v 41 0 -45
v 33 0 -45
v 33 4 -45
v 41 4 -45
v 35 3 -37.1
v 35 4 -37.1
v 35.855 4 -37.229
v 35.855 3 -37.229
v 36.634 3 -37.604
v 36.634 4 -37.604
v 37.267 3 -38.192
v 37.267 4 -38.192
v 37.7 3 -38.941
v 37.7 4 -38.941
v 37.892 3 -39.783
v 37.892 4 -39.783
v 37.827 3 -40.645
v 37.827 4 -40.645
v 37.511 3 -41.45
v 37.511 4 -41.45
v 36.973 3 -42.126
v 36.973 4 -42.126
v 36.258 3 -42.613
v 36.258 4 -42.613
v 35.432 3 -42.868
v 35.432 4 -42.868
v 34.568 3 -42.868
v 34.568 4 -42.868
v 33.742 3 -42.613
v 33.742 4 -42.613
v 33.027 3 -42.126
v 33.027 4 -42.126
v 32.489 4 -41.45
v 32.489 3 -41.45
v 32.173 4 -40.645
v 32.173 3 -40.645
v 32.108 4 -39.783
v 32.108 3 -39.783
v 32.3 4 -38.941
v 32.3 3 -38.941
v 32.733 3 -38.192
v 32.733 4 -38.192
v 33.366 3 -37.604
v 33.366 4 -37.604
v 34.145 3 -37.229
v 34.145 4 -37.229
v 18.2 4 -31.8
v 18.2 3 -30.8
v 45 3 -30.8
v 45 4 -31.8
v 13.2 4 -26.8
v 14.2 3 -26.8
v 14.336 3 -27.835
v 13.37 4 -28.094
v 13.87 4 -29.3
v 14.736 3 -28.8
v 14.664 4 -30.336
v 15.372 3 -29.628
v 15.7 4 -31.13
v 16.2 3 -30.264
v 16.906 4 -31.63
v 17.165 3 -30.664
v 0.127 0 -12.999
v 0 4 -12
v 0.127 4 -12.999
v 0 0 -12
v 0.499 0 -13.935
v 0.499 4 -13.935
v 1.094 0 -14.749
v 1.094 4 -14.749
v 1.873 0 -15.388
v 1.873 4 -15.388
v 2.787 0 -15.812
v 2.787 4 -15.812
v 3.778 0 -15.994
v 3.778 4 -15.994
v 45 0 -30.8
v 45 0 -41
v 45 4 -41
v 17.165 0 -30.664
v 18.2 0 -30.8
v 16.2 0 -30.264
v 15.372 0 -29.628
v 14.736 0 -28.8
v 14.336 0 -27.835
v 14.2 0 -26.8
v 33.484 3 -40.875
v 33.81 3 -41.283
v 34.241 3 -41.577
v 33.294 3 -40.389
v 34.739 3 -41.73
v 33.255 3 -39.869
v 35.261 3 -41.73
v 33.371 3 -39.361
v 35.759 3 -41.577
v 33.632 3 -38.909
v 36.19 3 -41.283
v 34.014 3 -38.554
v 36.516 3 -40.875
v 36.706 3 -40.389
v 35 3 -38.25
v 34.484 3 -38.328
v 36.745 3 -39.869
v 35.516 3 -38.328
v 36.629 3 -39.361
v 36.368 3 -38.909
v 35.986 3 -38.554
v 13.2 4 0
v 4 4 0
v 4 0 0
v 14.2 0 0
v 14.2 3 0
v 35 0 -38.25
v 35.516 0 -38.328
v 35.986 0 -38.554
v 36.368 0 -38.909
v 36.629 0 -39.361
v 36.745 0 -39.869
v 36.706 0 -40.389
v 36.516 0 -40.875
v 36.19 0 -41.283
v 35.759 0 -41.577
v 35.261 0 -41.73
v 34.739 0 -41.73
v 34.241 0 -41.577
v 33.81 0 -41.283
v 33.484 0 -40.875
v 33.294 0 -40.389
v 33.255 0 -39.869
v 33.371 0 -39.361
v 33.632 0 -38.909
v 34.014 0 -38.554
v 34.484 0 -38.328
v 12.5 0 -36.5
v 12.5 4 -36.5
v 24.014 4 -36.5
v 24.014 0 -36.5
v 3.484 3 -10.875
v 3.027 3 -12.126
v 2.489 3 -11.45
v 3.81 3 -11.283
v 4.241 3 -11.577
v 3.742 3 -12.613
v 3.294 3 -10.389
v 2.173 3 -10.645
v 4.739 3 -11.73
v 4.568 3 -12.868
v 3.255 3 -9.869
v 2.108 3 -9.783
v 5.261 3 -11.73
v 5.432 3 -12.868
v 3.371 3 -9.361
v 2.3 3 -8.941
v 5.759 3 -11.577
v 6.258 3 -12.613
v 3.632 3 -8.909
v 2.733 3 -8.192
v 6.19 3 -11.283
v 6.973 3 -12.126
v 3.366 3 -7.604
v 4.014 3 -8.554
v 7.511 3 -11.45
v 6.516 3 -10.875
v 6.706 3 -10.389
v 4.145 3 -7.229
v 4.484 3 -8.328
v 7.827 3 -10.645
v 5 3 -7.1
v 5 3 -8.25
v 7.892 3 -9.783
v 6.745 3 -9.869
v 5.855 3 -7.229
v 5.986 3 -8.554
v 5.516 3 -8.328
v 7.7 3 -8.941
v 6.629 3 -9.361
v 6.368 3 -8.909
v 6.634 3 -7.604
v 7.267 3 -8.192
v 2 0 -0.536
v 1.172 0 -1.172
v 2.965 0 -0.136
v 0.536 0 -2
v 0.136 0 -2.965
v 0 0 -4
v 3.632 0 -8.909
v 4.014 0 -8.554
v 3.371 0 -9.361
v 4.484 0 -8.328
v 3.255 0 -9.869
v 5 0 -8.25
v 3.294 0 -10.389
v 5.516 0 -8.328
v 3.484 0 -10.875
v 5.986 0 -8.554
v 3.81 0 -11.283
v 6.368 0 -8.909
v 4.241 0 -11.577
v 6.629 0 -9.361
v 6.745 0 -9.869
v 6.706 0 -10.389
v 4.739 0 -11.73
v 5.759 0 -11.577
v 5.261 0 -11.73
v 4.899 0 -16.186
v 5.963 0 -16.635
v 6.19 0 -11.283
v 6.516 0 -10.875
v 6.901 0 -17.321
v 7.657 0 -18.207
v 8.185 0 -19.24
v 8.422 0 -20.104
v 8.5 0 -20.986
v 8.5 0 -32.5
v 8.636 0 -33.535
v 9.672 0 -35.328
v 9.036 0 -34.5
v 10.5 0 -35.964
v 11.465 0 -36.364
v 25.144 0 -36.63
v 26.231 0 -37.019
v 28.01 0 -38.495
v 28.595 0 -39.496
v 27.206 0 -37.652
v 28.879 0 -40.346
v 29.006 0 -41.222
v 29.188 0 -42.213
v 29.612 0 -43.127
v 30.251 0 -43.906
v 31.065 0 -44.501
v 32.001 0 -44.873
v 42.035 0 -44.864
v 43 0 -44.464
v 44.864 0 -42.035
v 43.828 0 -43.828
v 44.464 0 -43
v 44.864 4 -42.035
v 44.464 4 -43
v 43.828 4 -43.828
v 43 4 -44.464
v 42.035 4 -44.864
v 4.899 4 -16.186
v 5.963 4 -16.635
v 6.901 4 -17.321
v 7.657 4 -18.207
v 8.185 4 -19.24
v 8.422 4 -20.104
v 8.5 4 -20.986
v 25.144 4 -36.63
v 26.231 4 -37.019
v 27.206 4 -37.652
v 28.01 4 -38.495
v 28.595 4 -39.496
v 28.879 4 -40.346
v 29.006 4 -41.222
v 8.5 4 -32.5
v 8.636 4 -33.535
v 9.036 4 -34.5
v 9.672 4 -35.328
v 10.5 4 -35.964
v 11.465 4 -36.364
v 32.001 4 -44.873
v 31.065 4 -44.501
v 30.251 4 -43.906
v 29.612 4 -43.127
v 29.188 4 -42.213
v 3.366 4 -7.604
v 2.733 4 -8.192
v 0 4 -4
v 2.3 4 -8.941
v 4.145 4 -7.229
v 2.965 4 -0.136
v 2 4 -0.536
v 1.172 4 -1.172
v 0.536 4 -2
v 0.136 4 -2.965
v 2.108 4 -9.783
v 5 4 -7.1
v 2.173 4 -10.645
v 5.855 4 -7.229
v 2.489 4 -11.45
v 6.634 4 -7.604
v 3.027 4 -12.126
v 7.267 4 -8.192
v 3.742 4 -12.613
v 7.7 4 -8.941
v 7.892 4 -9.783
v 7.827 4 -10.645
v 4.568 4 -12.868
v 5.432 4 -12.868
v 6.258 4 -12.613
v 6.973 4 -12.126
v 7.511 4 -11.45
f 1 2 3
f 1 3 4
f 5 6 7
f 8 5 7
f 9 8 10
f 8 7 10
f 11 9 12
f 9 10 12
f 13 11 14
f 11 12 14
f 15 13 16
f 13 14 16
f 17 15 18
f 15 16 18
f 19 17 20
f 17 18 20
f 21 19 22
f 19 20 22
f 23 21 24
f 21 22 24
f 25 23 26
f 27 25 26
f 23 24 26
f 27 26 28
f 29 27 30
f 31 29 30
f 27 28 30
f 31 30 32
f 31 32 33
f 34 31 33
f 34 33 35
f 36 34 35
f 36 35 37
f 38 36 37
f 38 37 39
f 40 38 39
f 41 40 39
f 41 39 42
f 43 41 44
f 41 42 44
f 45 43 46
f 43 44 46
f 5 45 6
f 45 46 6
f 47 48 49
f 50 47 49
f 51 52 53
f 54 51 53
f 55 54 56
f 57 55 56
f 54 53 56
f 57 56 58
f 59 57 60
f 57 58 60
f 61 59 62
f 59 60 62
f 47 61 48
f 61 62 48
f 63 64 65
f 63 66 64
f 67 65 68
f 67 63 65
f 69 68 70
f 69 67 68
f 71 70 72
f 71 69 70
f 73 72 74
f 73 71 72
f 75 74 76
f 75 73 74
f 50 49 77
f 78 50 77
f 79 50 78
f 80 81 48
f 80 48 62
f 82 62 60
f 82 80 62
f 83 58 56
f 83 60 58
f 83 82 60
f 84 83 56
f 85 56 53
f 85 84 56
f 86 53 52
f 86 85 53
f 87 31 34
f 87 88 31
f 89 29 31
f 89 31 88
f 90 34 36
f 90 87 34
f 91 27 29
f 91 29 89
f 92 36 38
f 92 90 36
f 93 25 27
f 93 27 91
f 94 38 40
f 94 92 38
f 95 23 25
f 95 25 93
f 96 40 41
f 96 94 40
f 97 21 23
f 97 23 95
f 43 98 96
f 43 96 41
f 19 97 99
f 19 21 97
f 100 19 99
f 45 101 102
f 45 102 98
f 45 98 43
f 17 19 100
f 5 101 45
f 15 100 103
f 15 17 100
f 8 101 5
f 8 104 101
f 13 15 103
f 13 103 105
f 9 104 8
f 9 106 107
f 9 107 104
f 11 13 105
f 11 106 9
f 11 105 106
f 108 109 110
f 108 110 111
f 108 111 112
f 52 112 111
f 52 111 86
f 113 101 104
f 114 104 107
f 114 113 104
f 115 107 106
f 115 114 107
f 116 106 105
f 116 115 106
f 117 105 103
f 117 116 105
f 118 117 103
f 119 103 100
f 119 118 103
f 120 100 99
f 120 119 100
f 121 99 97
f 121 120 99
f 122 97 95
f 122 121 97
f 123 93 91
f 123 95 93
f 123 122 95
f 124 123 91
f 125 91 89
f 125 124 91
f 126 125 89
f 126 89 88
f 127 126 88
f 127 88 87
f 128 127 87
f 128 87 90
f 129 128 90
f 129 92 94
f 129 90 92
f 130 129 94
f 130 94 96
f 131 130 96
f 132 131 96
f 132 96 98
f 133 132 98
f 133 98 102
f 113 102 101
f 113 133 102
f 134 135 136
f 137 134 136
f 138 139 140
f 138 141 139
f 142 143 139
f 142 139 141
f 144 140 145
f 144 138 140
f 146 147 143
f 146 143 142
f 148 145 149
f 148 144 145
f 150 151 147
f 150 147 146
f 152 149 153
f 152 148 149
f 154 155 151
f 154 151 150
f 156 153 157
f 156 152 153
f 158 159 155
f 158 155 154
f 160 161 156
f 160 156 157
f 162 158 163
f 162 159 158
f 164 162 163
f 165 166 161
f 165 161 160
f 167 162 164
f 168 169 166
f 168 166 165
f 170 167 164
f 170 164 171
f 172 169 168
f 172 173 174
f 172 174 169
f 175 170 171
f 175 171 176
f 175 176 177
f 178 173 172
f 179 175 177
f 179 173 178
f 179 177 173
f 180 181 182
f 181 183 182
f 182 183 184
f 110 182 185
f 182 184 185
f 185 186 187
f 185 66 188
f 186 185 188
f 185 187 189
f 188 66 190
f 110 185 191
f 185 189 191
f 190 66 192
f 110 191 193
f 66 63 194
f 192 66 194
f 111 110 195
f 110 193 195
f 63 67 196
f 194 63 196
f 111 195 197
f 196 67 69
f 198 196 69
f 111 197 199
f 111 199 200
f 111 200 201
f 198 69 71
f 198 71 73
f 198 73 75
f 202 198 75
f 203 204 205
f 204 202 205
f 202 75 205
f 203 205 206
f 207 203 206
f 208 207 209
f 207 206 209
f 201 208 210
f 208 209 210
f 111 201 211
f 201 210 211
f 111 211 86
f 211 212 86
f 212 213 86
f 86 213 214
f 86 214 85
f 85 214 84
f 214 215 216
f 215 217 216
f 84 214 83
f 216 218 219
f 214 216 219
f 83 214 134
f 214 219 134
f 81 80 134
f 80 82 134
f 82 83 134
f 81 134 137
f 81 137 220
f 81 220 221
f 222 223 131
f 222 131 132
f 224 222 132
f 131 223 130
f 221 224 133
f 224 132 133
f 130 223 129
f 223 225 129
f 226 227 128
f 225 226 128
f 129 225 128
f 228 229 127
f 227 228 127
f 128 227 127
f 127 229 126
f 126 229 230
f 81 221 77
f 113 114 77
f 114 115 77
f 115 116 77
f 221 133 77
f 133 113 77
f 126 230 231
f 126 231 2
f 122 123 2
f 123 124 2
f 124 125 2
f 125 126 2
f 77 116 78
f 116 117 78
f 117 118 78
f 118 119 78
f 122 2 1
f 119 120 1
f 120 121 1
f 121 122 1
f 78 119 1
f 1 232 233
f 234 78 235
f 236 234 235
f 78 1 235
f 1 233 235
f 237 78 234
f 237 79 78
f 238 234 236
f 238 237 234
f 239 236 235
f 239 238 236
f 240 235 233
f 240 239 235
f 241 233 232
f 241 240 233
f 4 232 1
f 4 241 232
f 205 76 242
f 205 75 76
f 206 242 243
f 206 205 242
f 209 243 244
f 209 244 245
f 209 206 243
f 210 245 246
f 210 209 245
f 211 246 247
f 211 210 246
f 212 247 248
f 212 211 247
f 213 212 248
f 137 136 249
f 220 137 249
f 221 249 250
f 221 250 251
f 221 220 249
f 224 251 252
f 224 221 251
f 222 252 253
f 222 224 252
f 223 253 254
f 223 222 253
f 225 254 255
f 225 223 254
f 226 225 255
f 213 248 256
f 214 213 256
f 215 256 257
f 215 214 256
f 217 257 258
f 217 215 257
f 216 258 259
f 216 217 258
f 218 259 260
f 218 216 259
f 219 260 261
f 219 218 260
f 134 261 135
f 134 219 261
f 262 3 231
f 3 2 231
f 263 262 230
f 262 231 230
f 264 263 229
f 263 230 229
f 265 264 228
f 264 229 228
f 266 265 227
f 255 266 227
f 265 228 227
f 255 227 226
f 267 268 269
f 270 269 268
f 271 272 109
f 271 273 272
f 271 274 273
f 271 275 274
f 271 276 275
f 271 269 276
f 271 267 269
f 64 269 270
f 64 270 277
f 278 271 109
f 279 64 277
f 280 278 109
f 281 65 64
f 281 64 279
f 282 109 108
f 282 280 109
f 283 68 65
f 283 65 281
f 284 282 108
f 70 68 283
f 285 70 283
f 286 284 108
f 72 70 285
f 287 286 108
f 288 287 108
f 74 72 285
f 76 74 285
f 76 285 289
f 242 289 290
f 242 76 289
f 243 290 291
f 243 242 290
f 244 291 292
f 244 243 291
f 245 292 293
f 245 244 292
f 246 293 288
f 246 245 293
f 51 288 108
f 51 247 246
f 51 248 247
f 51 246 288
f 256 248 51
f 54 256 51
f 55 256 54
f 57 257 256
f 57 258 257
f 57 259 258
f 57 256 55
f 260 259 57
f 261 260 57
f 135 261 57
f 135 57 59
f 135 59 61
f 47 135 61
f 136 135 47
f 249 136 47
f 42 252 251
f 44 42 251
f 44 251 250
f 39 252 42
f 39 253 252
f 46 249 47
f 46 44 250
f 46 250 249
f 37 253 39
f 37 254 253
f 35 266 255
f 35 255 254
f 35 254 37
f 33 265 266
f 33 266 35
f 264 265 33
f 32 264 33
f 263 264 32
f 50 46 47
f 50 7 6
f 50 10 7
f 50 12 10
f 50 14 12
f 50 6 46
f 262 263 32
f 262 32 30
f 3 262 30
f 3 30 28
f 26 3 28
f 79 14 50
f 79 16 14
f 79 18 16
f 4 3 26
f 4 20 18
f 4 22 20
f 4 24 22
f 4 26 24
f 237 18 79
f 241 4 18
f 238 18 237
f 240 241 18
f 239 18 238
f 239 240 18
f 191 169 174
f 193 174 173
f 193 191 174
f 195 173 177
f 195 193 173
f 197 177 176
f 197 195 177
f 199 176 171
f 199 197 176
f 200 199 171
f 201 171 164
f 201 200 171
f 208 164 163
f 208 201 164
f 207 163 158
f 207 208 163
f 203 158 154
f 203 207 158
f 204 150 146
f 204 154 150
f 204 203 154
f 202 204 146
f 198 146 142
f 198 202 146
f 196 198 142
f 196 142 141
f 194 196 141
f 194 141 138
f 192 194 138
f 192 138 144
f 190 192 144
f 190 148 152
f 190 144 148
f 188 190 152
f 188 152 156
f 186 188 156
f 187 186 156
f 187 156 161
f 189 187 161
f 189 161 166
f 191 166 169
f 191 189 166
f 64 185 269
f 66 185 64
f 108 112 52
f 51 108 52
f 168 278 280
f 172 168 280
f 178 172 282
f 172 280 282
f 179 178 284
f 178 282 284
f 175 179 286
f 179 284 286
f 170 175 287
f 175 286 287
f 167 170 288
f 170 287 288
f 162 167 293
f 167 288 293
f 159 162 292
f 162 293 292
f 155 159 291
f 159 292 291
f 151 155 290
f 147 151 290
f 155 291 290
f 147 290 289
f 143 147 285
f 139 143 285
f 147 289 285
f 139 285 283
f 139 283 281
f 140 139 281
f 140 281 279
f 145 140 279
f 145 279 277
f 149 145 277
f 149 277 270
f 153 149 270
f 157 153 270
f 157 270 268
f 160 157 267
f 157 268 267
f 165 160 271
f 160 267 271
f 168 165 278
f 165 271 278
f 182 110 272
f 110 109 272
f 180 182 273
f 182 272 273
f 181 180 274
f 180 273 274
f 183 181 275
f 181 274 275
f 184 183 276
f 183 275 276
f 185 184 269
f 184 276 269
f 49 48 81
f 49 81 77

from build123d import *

# Parameters (mm, degrees)
CROQUIS1_R              = 1.75
SALIENTE_EXTRUIR1_DEPTH = 4
CROQUIS2_W              = 30.8
CROQUIS2_H              = 4.2
SALIENTE_EXTRUIR2_DEPTH = 4
CROQUIS3_W              = 8.5
CROQUIS3_H              = 20.5
CORTAR_EXTRUIR1_DEPTH   = 4
REDONDEO1_R             = 4
REDONDEO2_R             = 4
CHAFL_N1_SIZE           = 1
CROQUIS4_R              = 2.9
CORTAR_EXTRUIR2_DEPTH   = 1
REDONDEO3_R             = 5


with BuildPart() as part:
    # Croquis1 → Saliente-Extruir1 (new body)
    with BuildSketch(Plane(origin=(0, 0, 0), x_dir=(1, 0, 0), z_dir=(0, 1, 0))):
        Polygon((0, 0), (0, 45), (45, 45), (45, 35), (10, 35), (10, 0), align=None)
        with Locations(Location((35, 40, 0), (0, 0, 270))):
            Circle(CROQUIS1_R, mode=Mode.SUBTRACT)
        with Locations(Location((5, 10, 0), (0, 0, 270))):
            Circle(CROQUIS1_R, mode=Mode.SUBTRACT)
    extrude(amount=SALIENTE_EXTRUIR1_DEPTH)

    # Croquis2 → Saliente-Extruir2 (add)
    with BuildSketch(Plane(origin=(0, 4, 0), x_dir=(1, 0, 0), z_dir=(0, 1, 0))):
        with Locations((29.6, 32.9)):
            Rectangle(CROQUIS2_W, CROQUIS2_H)
        Polygon((10, 35), (10, 0), (14.2, 0), (14.2, 30.8), (14.2, 35), align=None)
    extrude(amount=-SALIENTE_EXTRUIR2_DEPTH)

    # Croquis3 → Cortar-Extruir1 (cut)
    with BuildSketch(Plane(origin=(0, 4, 0), x_dir=(1, 0, 0), z_dir=(0, 1, 0))):
        Polygon((29, 45), (0, 45), (0, 36.5), (8.5, 36.5), (29, 36.5), align=None)
        with Locations((4.25, 26.25)):
            Rectangle(CROQUIS3_W, CROQUIS3_H)
    extrude(amount=-CORTAR_EXTRUIR1_DEPTH, mode=Mode.SUBTRACT)

    # Redondeo1
    redondeo1_edges = [part.edges().sort_by_distance(p)[0] for p in [
        (14.2, 2, -30.8),
        (8.5, 2, -36.5),
    ]]
    fillet(redondeo1_edges, radius=REDONDEO1_R)

    # Redondeo2
    redondeo2_edges = [part.edges().sort_by_distance(p)[0] for p in [
        (0, 2, 0),
        (45, 2, -45),
        (0, 2, -16),
        (29, 2, -45),
    ]]
    fillet(redondeo2_edges, radius=REDONDEO2_R)

    # Chaflán1
    chafl_n1_edges = [part.edges().sort_by_distance(p)[0] for p in [
        (31.6, 4, -30.8),
        (14.2, 4, -13.4),
        (15.371572875, 4, -29.628427125),
    ]]
    chamfer(chafl_n1_edges, length=CHAFL_N1_SIZE)

    # Croquis4 → Cortar-Extruir2 (cut)
    with BuildSketch(Plane(origin=(0, 4, 0), x_dir=(1, 0, 0), z_dir=(0, 1, 0))):
        with Locations(Location((35, 40, 0), (0, 0, 270))):
            Circle(CROQUIS4_R)
        with Locations(Location((5, 10, 0), (0, 0, 270))):
            Circle(CROQUIS4_R)
    extrude(amount=-CORTAR_EXTRUIR2_DEPTH, mode=Mode.SUBTRACT)

    # Redondeo3
    redondeo3_edges = [part.edges().sort_by_distance(p)[0] for p in [
        (8.5, 2, -16),
        (29, 2, -36.5),
    ]]
    fillet(redondeo3_edges, radius=REDONDEO3_R)


solid = part.part
